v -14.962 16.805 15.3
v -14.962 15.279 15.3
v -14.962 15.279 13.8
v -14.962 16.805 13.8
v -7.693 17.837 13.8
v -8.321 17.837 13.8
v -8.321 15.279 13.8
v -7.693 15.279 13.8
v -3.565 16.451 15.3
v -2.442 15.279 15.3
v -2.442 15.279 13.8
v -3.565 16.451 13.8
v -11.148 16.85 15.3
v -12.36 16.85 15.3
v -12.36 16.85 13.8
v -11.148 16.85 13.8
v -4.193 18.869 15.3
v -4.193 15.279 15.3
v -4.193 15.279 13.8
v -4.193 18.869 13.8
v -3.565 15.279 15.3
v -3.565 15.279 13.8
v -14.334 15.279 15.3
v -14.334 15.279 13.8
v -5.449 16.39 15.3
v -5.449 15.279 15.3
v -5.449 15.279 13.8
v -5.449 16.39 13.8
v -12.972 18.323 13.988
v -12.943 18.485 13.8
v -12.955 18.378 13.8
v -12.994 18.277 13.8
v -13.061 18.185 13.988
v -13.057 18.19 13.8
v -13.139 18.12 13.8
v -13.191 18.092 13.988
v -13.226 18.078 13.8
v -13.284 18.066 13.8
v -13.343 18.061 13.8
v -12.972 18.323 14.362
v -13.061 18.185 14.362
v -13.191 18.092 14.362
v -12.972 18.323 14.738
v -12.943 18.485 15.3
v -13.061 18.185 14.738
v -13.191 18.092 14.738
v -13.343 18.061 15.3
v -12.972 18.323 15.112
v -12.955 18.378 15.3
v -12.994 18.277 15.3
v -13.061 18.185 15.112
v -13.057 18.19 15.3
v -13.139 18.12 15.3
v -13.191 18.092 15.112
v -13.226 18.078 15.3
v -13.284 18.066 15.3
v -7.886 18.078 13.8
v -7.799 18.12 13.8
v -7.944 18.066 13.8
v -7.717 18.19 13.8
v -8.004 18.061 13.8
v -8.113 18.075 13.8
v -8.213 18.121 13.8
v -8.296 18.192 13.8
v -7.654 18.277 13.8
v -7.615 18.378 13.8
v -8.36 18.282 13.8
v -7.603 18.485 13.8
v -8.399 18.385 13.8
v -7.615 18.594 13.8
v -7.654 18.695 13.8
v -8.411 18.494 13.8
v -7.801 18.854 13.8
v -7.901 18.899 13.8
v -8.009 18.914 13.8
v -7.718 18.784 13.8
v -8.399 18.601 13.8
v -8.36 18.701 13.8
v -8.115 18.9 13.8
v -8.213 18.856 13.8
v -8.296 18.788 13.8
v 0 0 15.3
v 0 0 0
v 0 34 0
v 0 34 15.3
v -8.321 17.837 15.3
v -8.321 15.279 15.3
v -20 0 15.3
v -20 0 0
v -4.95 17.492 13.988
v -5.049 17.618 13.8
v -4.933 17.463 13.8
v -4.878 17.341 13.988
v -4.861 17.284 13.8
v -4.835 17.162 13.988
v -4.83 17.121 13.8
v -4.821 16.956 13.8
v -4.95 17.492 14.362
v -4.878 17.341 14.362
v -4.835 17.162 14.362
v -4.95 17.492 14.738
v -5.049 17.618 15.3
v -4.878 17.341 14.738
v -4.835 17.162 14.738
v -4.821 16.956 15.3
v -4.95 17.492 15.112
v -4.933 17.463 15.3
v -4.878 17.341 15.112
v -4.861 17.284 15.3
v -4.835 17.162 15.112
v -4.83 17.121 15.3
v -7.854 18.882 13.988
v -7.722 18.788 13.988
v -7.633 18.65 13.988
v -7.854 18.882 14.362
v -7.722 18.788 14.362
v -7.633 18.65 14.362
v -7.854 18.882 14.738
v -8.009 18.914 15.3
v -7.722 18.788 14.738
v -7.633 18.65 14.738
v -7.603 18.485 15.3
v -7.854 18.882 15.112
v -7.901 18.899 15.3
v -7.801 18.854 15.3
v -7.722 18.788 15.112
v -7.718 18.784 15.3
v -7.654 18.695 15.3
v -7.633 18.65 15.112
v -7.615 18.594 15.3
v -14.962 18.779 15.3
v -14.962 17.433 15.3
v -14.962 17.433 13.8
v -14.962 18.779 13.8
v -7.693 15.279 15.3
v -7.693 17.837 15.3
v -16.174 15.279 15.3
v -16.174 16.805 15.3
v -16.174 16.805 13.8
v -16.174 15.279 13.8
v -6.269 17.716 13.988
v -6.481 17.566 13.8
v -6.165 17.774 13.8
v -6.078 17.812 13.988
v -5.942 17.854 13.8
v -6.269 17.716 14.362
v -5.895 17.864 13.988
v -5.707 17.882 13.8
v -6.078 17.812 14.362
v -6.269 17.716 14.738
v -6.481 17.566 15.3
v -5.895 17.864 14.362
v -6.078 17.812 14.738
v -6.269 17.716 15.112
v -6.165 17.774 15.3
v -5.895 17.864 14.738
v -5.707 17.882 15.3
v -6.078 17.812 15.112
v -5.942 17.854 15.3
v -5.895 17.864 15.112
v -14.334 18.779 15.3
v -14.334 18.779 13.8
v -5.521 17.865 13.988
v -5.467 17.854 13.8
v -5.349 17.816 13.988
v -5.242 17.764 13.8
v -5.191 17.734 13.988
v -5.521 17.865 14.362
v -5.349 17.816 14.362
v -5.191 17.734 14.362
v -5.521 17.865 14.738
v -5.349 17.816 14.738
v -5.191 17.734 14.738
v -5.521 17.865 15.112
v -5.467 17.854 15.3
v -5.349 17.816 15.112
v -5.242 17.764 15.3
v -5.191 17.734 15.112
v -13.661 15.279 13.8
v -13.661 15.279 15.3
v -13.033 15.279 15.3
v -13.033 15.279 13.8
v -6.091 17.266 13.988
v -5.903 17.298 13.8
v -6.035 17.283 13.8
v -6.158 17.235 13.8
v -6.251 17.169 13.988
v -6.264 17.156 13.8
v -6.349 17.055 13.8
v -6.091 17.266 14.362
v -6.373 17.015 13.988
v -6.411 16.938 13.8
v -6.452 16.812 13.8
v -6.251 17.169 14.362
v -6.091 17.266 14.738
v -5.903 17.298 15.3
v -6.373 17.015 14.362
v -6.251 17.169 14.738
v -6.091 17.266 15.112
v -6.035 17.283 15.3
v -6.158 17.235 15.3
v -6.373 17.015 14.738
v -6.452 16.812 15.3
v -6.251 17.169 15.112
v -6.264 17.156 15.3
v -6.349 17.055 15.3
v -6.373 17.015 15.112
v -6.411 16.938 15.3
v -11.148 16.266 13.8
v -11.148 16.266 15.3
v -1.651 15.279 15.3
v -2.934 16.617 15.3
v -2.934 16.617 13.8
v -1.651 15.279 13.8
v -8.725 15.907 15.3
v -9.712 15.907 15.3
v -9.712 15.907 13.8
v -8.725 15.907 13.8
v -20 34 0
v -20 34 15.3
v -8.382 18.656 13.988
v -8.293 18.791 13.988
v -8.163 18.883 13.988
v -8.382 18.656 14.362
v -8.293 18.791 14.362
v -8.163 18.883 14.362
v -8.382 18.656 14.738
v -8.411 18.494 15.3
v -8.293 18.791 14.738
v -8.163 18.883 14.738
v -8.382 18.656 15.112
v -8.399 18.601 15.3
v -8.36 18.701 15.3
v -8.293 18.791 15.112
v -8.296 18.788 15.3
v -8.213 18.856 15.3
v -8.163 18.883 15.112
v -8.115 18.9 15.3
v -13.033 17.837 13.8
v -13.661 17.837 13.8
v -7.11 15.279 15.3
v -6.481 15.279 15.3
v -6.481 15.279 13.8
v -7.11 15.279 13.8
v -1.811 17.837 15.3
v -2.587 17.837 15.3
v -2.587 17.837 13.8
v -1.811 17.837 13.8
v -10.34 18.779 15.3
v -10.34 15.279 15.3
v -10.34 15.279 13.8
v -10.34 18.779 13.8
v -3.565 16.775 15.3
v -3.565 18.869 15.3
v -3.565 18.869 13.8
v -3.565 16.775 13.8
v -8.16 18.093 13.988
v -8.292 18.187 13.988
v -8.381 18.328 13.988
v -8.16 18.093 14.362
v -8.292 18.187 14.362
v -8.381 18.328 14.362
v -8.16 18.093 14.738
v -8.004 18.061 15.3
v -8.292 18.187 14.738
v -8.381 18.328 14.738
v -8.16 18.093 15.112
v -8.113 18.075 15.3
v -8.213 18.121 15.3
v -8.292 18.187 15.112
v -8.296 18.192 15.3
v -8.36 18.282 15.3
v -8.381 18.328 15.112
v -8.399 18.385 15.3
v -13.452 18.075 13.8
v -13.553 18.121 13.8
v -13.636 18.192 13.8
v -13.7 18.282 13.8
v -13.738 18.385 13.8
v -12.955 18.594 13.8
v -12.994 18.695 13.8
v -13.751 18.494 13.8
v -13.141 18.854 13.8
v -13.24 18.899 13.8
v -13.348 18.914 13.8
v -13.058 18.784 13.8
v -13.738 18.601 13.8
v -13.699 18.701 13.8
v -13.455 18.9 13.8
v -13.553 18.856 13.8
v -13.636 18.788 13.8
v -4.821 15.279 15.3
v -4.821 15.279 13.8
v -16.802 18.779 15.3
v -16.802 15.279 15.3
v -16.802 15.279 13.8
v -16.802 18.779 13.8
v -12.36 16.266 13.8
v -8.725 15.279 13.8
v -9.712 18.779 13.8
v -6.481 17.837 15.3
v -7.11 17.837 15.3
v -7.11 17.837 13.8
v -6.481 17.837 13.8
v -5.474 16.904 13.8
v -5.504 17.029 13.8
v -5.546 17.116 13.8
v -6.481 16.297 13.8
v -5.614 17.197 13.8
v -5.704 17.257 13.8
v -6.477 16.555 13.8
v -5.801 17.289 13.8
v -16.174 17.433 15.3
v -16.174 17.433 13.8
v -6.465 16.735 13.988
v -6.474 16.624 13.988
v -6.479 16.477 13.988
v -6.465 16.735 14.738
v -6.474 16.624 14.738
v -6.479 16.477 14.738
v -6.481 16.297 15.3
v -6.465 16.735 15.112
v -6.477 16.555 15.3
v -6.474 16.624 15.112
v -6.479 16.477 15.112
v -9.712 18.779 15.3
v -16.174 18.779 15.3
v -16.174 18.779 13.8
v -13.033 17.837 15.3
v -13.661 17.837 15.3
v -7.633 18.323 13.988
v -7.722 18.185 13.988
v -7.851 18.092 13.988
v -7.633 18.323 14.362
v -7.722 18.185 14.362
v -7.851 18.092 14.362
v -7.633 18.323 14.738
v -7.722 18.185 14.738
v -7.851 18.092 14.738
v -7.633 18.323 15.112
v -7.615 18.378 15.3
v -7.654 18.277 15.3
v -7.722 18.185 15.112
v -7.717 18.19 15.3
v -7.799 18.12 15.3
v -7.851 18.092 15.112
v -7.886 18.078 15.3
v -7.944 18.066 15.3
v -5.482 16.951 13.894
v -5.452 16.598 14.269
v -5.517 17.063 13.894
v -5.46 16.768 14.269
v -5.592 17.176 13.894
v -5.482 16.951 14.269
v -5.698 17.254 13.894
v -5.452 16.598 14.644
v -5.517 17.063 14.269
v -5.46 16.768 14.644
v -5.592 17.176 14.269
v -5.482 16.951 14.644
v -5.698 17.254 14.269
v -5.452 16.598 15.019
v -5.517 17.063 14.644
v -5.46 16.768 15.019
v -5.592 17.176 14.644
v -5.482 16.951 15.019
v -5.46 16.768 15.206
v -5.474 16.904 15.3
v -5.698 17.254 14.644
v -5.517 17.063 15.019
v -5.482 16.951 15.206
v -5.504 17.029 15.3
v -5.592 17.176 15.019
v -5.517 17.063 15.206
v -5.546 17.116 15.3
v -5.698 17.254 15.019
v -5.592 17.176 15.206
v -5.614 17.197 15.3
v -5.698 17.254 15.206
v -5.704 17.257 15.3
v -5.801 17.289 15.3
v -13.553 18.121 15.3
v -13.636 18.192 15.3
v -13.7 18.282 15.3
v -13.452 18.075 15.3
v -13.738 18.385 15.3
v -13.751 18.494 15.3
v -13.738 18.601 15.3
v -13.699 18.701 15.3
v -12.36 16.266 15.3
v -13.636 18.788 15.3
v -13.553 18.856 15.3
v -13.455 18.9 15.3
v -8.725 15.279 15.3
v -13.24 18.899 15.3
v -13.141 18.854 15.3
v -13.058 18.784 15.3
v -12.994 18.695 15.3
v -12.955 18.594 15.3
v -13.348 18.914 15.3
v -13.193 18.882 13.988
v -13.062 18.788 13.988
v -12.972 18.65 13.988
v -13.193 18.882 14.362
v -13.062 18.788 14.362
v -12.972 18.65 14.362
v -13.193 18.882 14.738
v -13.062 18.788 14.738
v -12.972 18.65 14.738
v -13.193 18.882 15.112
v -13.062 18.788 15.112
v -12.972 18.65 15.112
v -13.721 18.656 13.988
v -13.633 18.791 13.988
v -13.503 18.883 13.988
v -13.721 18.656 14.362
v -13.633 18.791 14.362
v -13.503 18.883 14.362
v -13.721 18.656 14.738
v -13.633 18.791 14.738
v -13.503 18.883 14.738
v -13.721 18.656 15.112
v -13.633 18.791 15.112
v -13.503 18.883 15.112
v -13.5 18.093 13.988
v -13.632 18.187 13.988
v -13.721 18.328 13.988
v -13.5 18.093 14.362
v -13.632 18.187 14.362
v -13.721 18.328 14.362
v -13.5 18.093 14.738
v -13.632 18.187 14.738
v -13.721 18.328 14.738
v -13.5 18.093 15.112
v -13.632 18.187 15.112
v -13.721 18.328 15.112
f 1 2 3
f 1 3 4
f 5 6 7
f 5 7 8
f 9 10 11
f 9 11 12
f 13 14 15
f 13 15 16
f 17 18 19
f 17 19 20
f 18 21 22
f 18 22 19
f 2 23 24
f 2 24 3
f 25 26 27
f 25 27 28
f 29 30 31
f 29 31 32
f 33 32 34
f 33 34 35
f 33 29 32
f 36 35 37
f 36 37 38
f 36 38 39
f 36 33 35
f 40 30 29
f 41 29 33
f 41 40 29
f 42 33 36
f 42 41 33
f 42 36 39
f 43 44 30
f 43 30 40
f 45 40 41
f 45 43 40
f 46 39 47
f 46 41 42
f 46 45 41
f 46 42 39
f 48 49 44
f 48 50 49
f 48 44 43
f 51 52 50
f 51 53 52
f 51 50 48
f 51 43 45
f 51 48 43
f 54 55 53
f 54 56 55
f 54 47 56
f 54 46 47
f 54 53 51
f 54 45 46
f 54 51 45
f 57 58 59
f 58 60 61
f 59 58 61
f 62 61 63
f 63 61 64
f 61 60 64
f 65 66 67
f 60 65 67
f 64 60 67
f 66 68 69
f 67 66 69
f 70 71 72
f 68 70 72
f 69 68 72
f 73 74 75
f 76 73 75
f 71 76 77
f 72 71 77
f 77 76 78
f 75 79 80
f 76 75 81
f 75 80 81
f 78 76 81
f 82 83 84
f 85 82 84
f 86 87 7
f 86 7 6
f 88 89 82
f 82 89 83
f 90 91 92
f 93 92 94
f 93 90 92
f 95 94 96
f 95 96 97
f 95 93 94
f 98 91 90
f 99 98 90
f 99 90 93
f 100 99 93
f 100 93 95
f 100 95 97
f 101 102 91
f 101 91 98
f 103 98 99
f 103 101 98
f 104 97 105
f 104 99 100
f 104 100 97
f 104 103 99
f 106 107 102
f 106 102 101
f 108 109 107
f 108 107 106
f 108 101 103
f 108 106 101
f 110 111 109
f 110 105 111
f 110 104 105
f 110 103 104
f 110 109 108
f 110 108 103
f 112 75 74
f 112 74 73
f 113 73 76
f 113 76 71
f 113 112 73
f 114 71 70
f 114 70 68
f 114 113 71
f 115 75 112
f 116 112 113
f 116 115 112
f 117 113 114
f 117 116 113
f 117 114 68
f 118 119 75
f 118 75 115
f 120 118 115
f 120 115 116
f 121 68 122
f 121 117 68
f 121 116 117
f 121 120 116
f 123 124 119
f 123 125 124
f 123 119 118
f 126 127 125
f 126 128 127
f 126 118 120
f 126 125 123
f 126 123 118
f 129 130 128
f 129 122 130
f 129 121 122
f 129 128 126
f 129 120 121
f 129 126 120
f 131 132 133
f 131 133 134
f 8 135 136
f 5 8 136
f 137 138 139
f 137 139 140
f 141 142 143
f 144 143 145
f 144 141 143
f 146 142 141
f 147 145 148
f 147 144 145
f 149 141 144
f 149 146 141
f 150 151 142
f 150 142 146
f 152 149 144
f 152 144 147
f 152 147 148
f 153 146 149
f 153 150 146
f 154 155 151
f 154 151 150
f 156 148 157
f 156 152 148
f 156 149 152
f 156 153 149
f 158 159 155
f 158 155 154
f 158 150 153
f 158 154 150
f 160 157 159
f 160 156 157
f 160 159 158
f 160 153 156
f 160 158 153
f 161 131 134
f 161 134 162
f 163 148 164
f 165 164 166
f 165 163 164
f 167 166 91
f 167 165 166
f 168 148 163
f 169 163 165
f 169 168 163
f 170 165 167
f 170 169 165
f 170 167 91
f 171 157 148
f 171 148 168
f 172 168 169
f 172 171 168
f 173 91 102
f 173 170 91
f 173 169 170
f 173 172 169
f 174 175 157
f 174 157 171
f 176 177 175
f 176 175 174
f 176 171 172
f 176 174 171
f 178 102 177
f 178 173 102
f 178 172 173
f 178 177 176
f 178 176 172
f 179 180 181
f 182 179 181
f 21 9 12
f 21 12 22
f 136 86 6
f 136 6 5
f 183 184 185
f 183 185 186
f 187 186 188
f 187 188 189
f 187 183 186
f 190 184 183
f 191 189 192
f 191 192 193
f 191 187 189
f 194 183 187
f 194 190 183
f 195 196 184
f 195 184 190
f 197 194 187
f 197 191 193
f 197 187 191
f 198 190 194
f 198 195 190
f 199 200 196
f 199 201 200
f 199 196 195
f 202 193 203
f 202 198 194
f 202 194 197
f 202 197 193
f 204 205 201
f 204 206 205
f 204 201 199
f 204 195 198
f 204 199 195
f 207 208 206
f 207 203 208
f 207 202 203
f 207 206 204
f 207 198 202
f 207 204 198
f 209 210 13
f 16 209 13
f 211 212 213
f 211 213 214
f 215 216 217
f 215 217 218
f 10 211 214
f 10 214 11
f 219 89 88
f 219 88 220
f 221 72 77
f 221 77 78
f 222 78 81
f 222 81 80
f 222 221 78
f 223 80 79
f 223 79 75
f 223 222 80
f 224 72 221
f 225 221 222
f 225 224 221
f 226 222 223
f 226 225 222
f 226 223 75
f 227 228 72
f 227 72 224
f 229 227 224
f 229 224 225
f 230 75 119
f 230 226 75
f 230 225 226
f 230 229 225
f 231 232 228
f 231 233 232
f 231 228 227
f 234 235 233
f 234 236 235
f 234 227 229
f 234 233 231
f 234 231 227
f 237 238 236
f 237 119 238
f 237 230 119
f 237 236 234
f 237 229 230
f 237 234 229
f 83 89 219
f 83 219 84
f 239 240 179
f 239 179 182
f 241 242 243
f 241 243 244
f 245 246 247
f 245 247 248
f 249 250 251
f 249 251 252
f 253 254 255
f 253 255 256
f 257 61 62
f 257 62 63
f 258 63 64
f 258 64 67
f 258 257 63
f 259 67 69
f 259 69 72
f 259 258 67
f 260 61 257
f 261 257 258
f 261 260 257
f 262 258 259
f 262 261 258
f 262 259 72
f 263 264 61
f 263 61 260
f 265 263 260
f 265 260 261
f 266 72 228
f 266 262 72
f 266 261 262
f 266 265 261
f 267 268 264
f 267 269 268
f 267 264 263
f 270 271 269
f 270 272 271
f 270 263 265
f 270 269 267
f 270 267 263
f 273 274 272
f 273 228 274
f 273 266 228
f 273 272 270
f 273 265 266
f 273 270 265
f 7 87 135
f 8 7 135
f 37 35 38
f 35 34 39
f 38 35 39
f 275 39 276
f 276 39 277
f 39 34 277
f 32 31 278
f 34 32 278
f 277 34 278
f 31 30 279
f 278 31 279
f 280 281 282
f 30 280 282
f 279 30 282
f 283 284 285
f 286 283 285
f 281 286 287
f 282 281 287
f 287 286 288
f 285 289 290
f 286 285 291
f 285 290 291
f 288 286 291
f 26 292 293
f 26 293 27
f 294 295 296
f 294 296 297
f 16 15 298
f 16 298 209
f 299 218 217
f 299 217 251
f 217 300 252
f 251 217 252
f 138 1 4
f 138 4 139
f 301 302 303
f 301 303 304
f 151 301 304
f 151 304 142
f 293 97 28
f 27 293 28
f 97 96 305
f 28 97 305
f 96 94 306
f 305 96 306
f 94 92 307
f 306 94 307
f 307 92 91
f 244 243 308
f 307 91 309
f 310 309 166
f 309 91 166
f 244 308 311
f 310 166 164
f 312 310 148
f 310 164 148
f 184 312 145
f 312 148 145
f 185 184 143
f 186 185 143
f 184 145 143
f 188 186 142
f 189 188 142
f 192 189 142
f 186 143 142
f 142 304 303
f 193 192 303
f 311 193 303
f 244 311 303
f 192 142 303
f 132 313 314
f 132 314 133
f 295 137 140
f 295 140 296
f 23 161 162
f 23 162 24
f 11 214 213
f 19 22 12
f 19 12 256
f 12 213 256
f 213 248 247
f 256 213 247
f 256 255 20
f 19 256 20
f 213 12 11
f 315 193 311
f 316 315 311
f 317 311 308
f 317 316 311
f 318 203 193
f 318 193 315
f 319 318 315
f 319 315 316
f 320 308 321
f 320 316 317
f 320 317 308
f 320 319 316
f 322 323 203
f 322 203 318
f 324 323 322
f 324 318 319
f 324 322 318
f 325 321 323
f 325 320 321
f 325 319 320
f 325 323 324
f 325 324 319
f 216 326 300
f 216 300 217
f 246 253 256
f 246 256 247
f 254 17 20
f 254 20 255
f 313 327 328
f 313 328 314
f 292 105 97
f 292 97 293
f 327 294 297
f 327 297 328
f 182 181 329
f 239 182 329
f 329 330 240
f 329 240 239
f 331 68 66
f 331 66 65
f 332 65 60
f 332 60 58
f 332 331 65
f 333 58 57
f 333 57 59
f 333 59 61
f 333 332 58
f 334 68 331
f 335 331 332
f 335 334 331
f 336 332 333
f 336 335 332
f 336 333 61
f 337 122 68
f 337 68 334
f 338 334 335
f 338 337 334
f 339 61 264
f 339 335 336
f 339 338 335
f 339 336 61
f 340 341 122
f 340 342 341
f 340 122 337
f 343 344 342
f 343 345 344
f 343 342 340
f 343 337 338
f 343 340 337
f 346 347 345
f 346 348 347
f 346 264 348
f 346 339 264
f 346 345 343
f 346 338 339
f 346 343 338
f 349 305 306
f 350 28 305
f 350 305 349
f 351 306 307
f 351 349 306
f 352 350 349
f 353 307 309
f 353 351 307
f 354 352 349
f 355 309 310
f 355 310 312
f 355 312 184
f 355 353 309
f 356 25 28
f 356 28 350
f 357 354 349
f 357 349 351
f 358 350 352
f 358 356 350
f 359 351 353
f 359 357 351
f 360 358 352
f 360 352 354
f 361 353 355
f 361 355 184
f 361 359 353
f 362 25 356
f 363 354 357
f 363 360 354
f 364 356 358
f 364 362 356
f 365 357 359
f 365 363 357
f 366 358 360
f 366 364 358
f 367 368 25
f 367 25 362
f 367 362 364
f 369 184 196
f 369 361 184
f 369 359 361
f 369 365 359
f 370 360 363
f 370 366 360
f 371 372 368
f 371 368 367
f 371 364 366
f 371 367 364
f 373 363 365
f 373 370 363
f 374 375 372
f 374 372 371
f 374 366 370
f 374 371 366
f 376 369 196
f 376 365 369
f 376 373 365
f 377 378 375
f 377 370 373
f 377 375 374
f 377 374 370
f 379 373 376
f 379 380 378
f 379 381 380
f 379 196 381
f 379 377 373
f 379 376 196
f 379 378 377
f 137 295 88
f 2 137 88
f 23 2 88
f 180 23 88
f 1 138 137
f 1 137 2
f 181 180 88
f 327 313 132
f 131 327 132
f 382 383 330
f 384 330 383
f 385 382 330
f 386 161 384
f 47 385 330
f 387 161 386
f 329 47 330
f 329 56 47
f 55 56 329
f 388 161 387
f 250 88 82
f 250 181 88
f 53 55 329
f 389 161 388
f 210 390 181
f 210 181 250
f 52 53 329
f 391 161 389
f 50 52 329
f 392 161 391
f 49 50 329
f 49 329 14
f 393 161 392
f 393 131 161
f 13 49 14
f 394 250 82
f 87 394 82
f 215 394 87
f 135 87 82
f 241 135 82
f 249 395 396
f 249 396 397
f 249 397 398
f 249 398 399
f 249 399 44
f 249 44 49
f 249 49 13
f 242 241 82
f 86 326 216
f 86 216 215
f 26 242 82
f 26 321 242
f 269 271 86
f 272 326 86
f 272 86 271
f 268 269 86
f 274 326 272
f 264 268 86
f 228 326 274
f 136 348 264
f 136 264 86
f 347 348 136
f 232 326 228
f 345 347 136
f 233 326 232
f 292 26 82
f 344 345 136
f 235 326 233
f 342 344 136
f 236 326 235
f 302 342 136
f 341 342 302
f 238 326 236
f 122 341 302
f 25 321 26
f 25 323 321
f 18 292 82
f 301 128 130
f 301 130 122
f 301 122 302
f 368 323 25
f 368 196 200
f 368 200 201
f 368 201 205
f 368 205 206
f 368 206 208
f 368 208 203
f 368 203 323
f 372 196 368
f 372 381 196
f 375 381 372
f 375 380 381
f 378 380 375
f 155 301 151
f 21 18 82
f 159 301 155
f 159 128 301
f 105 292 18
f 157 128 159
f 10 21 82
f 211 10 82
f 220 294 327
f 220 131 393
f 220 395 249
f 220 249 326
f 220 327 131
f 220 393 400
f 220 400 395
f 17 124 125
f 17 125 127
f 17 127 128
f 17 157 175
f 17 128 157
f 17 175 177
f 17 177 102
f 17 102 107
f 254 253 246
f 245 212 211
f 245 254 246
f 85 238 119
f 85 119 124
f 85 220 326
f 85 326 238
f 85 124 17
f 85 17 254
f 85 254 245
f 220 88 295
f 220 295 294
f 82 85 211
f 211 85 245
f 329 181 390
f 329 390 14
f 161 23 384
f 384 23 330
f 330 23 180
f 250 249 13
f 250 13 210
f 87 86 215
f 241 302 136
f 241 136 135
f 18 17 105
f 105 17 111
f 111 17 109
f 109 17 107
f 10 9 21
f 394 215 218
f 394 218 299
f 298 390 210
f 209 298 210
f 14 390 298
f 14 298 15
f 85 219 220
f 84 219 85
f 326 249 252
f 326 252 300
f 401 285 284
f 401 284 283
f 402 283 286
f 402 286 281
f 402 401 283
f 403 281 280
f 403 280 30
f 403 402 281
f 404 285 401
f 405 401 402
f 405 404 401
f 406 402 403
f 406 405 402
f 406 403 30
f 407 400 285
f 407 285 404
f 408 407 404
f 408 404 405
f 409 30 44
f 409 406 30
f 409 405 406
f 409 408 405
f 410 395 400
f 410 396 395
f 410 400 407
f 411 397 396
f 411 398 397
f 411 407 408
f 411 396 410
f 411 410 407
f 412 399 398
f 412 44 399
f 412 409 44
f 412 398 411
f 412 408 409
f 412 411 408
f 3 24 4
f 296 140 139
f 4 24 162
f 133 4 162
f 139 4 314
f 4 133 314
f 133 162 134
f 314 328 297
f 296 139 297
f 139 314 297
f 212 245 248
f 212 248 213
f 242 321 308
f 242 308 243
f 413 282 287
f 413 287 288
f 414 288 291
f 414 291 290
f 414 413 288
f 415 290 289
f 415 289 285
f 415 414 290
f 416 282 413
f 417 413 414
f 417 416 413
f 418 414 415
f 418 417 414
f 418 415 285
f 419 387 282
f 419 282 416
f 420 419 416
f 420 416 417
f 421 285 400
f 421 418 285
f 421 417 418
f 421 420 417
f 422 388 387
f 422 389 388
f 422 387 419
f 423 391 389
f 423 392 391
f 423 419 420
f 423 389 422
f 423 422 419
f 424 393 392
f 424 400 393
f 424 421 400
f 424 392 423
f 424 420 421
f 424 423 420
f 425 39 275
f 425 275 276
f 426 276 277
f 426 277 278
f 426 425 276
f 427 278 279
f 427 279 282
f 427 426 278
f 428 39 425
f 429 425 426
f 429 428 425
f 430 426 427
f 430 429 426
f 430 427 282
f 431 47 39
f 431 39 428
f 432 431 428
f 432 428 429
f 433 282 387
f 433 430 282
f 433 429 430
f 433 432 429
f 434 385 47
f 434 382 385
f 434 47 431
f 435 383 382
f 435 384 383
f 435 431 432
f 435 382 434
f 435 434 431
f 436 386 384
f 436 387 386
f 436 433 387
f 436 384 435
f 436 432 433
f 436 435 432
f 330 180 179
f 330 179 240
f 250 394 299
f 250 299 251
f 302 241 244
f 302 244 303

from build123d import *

# Parameters (mm, degrees)
ESBO_O1_W                = 20
ESBO_O1_H                = 34
RESSALTO_EXTRUS_O1_DEPTH = 15.3
ESBO_O2_W                = 0.628205129
ESBO_O2_H                = 2.557692308
ESBO_O2_W_2              = 1.211538461
ESBO_O2_H_2              = 0.583333334
ESBO_O2_W_3              = 0.628205128
CORTE_EXTRUS_O1_DEPTH    = 1.5


with BuildPart() as part:
    # Esboço1 → Ressalto-extrusão1 (new body)
    with BuildSketch(Plane.XY):
        with Locations((-10, 17)):
            Rectangle(ESBO_O1_W, ESBO_O1_H)
    extrude(amount=RESSALTO_EXTRUS_O1_DEPTH)

    # Esboço2 → Corte-extrusão1 (cut)
    with BuildSketch(Plane.XY.offset(15.3)):
        Polygon((-16.80198257, 18.779052447), (-16.173777441, 18.779052447), (-16.173777441, 17.432898601), (-14.96223898, 17.432898601), (-14.96223898, 18.779052447), (-14.334033852, 18.779052447), (-14.334033852, 15.279052447), (-14.96223898, 15.279052447), (-14.96223898, 16.804693473), (-16.173777441, 16.804693473), (-16.173777441, 15.279052447), (-16.80198257, 15.279052447), align=None)
        with BuildLine():
            add(Edge.make_bspline(
                [(-13.348256608, 18.913667832), (-13.321180971, 18.912339399), (-13.26801535, 18.909730892), (-13.191848363, 18.884303755), (-13.121942506, 18.844396624), (-13.060143789, 18.789643089), (-13.008745395, 18.724257353), (-12.969475113, 18.651053675), (-12.947599275, 18.569946357), (-12.944561045, 18.51391827), (-12.943008211, 18.485282415)],
                knots=[0, 0, 0, 0, 0.989868614, 1.943702388, 2.910836514, 3.924849579, 4.949916355, 5.946401046, 6.950409252, 8, 8, 8, 8], degree=3))
            add(Edge.make_bspline(
                [(-12.943008211, 18.485282415), (-12.944505487, 18.456857591), (-12.947423001, 18.401470467), (-12.969978599, 18.321464218), (-13.007672708, 18.248296095), (-13.059487397, 18.183881459), (-13.120616135, 18.130009762), (-13.188994496, 18.089378141), (-13.264431582, 18.06536551), (-13.316772234, 18.062538947), (-13.343348756, 18.061103729)],
                knots=[0, 0, 0, 0, 1.05296456, 2.051751585, 3.055639087, 4.085634717, 5.099016424, 6.062201612, 7.016062274, 8, 8, 8, 8], degree=3))
            add(Edge.make_bspline(
                [(-13.343348756, 18.061103729), (-13.37066074, 18.062427414), (-13.4242889, 18.06502652), (-13.501080613, 18.09051315), (-13.571918836, 18.130105987), (-13.63344947, 18.185978222), (-13.685436491, 18.251828573), (-13.722991431, 18.326736496), (-13.746482976, 18.408398424), (-13.749271401, 18.465256325), (-13.750700518, 18.494396998)],
                knots=[0, 0, 0, 0, 0.989065327, 1.942068821, 2.907541208, 3.917690034, 4.939857478, 5.938239964, 6.943311734, 8, 8, 8, 8], degree=3))
            add(Edge.make_bspline(
                [(-13.750700518, 18.494396998), (-13.749145248, 18.522339152), (-13.746090144, 18.57722748), (-13.724083268, 18.656531545), (-13.685713452, 18.728504555), (-13.634685286, 18.792693343), (-13.57342937, 18.846425519), (-13.503565478, 18.885120645), (-13.427911097, 18.909497568), (-13.375082261, 18.912263391), (-13.348256608, 18.913667832)],
                knots=[0, 0, 0, 0, 1.038616768, 2.040212704, 3.031499824, 4.052181184, 5.074969369, 6.039807101, 7.004644834, 8, 8, 8, 8], degree=3))
        make_face()
        with Locations((-13.346854365, 16.557898601)):
            Rectangle(ESBO_O2_W, ESBO_O2_H)
        with Locations((-11.753905647, 16.557898601)):
            Rectangle(ESBO_O2_W_2, ESBO_O2_H_2)
        Polygon((-10.340444108, 18.779052447), (-9.71223898, 18.779052447), (-9.71223898, 15.907257575), (-8.725059493, 15.907257575), (-8.725059493, 15.279052447), (-10.340444108, 15.279052447), align=None)
        with BuildLine():
            add(Edge.make_bspline(
                [(-8.008513018, 18.913667832), (-7.981437382, 18.912339399), (-7.928271761, 18.909730892), (-7.852104774, 18.884303755), (-7.782198916, 18.844396624), (-7.720400199, 18.789643089), (-7.669001805, 18.724257353), (-7.629731523, 18.651053675), (-7.607855685, 18.569946357), (-7.604817455, 18.51391827), (-7.603264621, 18.485282415)],
                knots=[0, 0, 0, 0, 0.989868614, 1.943702388, 2.910836514, 3.924849579, 4.949916355, 5.946401046, 6.950409252, 8, 8, 8, 8], degree=3))
            add(Edge.make_bspline(
                [(-7.603264621, 18.485282415), (-7.604761897, 18.456857591), (-7.607679411, 18.401470467), (-7.630235009, 18.321464218), (-7.667929118, 18.248296095), (-7.719743807, 18.183881459), (-7.780872545, 18.130009762), (-7.849250906, 18.089378141), (-7.924687993, 18.06536551), (-7.977028644, 18.062538947), (-8.003605166, 18.061103729)],
                knots=[0, 0, 0, 0, 1.05296456, 2.051751585, 3.055639087, 4.085634717, 5.099016424, 6.062201612, 7.016062274, 8, 8, 8, 8], degree=3))
            add(Edge.make_bspline(
                [(-8.003605166, 18.061103729), (-8.03091715, 18.062427414), (-8.08454531, 18.06502652), (-8.161337023, 18.09051315), (-8.232175246, 18.130105987), (-8.293705881, 18.185978222), (-8.345692901, 18.251828573), (-8.383247842, 18.326736496), (-8.406739386, 18.408398424), (-8.409527811, 18.465256325), (-8.410956929, 18.494396998)],
                knots=[0, 0, 0, 0, 0.989065327, 1.942068821, 2.907541208, 3.917690034, 4.939857478, 5.938239964, 6.943311734, 8, 8, 8, 8], degree=3))
            add(Edge.make_bspline(
                [(-8.410956929, 18.494396998), (-8.409401658, 18.522339152), (-8.406346555, 18.57722748), (-8.384339678, 18.656531545), (-8.345969862, 18.728504555), (-8.294941696, 18.792693343), (-8.23368578, 18.846425519), (-8.163821888, 18.885120645), (-8.088167507, 18.909497568), (-8.035338671, 18.912263391), (-8.008513018, 18.913667832)],
                knots=[0, 0, 0, 0, 1.038616768, 2.040212704, 3.031499824, 4.052181184, 5.074969369, 6.039807101, 7.004644834, 8, 8, 8, 8], degree=3))
        make_face()
        with Locations((-8.007110775, 16.557898601)):
            Rectangle(ESBO_O2_W_3, ESBO_O2_H)
        with BuildLine():
            Line((-7.109674877, 17.836744755), (-6.481469749, 17.836744755))
            Line((-6.481469749, 17.836744755), (-6.481469749, 17.566111742))
            add(Edge.make_bspline(
                [(-6.481469749, 17.566111742), (-6.445630958, 17.593987892), (-6.377136061, 17.647264633), (-6.273011992, 17.71519275), (-6.174731762, 17.770789186), (-6.0801046, 17.81307868), (-5.987350094, 17.843504153), (-5.894966016, 17.86536304), (-5.801576583, 17.879359886), (-5.738796215, 17.880864732), (-5.707431288, 17.88161655)],
                knots=[0, 0, 0, 0, 1.276643801, 2.439914479, 3.493451431, 4.44993799, 5.350072675, 6.235028322, 7.118224225, 8, 8, 8, 8], degree=3))
            add(Edge.make_bspline(
                [(-5.707431288, 17.88161655), (-5.67561579, 17.880757378), (-5.613159296, 17.879070751), (-5.52119555, 17.867274166), (-5.433333122, 17.845788847), (-5.348584071, 17.817262154), (-5.267810997, 17.779608556), (-5.190024382, 17.734901017), (-5.116895054, 17.68044421), (-5.071858776, 17.638972521), (-5.049077922, 17.617994755)],
                knots=[0, 0, 0, 0, 1.048836932, 2.058954983, 3.049370783, 4.026390553, 5.001981509, 5.982488534, 6.97947532, 8, 8, 8, 8], degree=3))
            add(Edge.make_bspline(
                [(-5.049077922, 17.617994755), (-5.030806839, 17.5985545), (-4.99413095, 17.559531712), (-4.947978953, 17.492753726), (-4.908375347, 17.419953499), (-4.875925695, 17.340291256), (-4.85194671, 17.253329305), (-4.83349935, 17.160118021), (-4.823148214, 17.060135491), (-4.821870317, 16.991448437), (-4.821213339, 16.956135781)],
                knots=[0, 0, 0, 0, 0.889584746, 1.785680191, 2.700364693, 3.65222533, 4.649950538, 5.707241244, 6.821271309, 8, 8, 8, 8], degree=3))
            Line((-4.821213339, 16.956135781), (-4.821213339, 15.279052447))
            Line((-4.821213339, 15.279052447), (-5.449418467, 15.279052447))
            Line((-5.449418467, 15.279052447), (-5.449418467, 16.38962937))
            add(Edge.make_bspline(
                [(-5.449418467, 16.38962937), (-5.449551319, 16.425854455), (-5.449805904, 16.495273106), (-5.451760555, 16.594621628), (-5.455577174, 16.684346245), (-5.459055922, 16.764610319), (-5.465886088, 16.83512886), (-5.472045642, 16.896348304), (-5.48149688, 16.947713262), (-5.493794475, 17.002963982), (-5.515269103, 17.062119982), (-5.548607417, 17.1244506), (-5.590901743, 17.17740185), (-5.640424613, 17.221344946), (-5.697121331, 17.256107965), (-5.760306801, 17.280565915), (-5.829642274, 17.295808709), (-5.877954417, 17.297437394), (-5.903044268, 17.298283216)],
                knots=[0, 0, 0, 0, 1.49886392, 2.872294502, 4.110984203, 5.214877267, 6.195405875, 7.042225351, 7.75923308, 8.355011229, 9.382752534, 10.352059385, 11.267231453, 12.171456522, 13.078624015, 14.003401117, 14.963110155, 16, 16, 16, 16], degree=3))
            add(Edge.make_bspline(
                [(-5.903044268, 17.298283216), (-5.935674676, 17.29662852), (-5.999506096, 17.293391611), (-6.091825477, 17.268982369), (-6.176619289, 17.227469432), (-6.253194699, 17.170023876), (-6.320822389, 17.099100218), (-6.376522348, 17.01451562), (-6.422207758, 16.918311526), (-6.441853163, 16.848066911), (-6.452022634, 16.811704691)],
                knots=[0, 0, 0, 0, 0.984188326, 1.925263693, 2.85911992, 3.81709677, 4.80007086, 5.801799564, 6.862098548, 8, 8, 8, 8], degree=3))
            add(Edge.make_bspline(
                [(-6.452022634, 16.811704691), (-6.454550151, 16.800284892), (-6.460187023, 16.774816444), (-6.464822638, 16.731790285), (-6.471271114, 16.680743913), (-6.473687199, 16.620753533), (-6.477888506, 16.552103054), (-6.47944235, 16.474701653), (-6.480998974, 16.388701101), (-6.481307625, 16.328632983), (-6.481469749, 16.297081293)],
                knots=[0, 0, 0, 0, 0.543362196, 1.211806945, 2.009705693, 2.934833164, 4.000995085, 5.207458376, 6.533175157, 8, 8, 8, 8], degree=3))
            Line((-6.481469749, 16.297081293), (-6.481469749, 15.279052447))
            Line((-6.481469749, 15.279052447), (-7.109674877, 15.279052447))
            Line((-7.109674877, 15.279052447), (-7.109674877, 17.836744755))
        make_face()
        Polygon((-4.193008211, 18.868796037), (-3.564803082, 18.868796037), (-3.564803082, 16.775246357), (-2.5874393, 17.836744755), (-1.811297473, 17.836744755), (-2.933793467, 16.617493954), (-1.650740582, 15.279052447), (-2.441605967, 15.279052447), (-3.564803082, 16.450626966), (-3.564803082, 15.279052447), (-4.193008211, 15.279052447), align=None)
    extrude(amount=-CORTE_EXTRUS_O1_DEPTH, mode=Mode.SUBTRACT)


solid = part.part
